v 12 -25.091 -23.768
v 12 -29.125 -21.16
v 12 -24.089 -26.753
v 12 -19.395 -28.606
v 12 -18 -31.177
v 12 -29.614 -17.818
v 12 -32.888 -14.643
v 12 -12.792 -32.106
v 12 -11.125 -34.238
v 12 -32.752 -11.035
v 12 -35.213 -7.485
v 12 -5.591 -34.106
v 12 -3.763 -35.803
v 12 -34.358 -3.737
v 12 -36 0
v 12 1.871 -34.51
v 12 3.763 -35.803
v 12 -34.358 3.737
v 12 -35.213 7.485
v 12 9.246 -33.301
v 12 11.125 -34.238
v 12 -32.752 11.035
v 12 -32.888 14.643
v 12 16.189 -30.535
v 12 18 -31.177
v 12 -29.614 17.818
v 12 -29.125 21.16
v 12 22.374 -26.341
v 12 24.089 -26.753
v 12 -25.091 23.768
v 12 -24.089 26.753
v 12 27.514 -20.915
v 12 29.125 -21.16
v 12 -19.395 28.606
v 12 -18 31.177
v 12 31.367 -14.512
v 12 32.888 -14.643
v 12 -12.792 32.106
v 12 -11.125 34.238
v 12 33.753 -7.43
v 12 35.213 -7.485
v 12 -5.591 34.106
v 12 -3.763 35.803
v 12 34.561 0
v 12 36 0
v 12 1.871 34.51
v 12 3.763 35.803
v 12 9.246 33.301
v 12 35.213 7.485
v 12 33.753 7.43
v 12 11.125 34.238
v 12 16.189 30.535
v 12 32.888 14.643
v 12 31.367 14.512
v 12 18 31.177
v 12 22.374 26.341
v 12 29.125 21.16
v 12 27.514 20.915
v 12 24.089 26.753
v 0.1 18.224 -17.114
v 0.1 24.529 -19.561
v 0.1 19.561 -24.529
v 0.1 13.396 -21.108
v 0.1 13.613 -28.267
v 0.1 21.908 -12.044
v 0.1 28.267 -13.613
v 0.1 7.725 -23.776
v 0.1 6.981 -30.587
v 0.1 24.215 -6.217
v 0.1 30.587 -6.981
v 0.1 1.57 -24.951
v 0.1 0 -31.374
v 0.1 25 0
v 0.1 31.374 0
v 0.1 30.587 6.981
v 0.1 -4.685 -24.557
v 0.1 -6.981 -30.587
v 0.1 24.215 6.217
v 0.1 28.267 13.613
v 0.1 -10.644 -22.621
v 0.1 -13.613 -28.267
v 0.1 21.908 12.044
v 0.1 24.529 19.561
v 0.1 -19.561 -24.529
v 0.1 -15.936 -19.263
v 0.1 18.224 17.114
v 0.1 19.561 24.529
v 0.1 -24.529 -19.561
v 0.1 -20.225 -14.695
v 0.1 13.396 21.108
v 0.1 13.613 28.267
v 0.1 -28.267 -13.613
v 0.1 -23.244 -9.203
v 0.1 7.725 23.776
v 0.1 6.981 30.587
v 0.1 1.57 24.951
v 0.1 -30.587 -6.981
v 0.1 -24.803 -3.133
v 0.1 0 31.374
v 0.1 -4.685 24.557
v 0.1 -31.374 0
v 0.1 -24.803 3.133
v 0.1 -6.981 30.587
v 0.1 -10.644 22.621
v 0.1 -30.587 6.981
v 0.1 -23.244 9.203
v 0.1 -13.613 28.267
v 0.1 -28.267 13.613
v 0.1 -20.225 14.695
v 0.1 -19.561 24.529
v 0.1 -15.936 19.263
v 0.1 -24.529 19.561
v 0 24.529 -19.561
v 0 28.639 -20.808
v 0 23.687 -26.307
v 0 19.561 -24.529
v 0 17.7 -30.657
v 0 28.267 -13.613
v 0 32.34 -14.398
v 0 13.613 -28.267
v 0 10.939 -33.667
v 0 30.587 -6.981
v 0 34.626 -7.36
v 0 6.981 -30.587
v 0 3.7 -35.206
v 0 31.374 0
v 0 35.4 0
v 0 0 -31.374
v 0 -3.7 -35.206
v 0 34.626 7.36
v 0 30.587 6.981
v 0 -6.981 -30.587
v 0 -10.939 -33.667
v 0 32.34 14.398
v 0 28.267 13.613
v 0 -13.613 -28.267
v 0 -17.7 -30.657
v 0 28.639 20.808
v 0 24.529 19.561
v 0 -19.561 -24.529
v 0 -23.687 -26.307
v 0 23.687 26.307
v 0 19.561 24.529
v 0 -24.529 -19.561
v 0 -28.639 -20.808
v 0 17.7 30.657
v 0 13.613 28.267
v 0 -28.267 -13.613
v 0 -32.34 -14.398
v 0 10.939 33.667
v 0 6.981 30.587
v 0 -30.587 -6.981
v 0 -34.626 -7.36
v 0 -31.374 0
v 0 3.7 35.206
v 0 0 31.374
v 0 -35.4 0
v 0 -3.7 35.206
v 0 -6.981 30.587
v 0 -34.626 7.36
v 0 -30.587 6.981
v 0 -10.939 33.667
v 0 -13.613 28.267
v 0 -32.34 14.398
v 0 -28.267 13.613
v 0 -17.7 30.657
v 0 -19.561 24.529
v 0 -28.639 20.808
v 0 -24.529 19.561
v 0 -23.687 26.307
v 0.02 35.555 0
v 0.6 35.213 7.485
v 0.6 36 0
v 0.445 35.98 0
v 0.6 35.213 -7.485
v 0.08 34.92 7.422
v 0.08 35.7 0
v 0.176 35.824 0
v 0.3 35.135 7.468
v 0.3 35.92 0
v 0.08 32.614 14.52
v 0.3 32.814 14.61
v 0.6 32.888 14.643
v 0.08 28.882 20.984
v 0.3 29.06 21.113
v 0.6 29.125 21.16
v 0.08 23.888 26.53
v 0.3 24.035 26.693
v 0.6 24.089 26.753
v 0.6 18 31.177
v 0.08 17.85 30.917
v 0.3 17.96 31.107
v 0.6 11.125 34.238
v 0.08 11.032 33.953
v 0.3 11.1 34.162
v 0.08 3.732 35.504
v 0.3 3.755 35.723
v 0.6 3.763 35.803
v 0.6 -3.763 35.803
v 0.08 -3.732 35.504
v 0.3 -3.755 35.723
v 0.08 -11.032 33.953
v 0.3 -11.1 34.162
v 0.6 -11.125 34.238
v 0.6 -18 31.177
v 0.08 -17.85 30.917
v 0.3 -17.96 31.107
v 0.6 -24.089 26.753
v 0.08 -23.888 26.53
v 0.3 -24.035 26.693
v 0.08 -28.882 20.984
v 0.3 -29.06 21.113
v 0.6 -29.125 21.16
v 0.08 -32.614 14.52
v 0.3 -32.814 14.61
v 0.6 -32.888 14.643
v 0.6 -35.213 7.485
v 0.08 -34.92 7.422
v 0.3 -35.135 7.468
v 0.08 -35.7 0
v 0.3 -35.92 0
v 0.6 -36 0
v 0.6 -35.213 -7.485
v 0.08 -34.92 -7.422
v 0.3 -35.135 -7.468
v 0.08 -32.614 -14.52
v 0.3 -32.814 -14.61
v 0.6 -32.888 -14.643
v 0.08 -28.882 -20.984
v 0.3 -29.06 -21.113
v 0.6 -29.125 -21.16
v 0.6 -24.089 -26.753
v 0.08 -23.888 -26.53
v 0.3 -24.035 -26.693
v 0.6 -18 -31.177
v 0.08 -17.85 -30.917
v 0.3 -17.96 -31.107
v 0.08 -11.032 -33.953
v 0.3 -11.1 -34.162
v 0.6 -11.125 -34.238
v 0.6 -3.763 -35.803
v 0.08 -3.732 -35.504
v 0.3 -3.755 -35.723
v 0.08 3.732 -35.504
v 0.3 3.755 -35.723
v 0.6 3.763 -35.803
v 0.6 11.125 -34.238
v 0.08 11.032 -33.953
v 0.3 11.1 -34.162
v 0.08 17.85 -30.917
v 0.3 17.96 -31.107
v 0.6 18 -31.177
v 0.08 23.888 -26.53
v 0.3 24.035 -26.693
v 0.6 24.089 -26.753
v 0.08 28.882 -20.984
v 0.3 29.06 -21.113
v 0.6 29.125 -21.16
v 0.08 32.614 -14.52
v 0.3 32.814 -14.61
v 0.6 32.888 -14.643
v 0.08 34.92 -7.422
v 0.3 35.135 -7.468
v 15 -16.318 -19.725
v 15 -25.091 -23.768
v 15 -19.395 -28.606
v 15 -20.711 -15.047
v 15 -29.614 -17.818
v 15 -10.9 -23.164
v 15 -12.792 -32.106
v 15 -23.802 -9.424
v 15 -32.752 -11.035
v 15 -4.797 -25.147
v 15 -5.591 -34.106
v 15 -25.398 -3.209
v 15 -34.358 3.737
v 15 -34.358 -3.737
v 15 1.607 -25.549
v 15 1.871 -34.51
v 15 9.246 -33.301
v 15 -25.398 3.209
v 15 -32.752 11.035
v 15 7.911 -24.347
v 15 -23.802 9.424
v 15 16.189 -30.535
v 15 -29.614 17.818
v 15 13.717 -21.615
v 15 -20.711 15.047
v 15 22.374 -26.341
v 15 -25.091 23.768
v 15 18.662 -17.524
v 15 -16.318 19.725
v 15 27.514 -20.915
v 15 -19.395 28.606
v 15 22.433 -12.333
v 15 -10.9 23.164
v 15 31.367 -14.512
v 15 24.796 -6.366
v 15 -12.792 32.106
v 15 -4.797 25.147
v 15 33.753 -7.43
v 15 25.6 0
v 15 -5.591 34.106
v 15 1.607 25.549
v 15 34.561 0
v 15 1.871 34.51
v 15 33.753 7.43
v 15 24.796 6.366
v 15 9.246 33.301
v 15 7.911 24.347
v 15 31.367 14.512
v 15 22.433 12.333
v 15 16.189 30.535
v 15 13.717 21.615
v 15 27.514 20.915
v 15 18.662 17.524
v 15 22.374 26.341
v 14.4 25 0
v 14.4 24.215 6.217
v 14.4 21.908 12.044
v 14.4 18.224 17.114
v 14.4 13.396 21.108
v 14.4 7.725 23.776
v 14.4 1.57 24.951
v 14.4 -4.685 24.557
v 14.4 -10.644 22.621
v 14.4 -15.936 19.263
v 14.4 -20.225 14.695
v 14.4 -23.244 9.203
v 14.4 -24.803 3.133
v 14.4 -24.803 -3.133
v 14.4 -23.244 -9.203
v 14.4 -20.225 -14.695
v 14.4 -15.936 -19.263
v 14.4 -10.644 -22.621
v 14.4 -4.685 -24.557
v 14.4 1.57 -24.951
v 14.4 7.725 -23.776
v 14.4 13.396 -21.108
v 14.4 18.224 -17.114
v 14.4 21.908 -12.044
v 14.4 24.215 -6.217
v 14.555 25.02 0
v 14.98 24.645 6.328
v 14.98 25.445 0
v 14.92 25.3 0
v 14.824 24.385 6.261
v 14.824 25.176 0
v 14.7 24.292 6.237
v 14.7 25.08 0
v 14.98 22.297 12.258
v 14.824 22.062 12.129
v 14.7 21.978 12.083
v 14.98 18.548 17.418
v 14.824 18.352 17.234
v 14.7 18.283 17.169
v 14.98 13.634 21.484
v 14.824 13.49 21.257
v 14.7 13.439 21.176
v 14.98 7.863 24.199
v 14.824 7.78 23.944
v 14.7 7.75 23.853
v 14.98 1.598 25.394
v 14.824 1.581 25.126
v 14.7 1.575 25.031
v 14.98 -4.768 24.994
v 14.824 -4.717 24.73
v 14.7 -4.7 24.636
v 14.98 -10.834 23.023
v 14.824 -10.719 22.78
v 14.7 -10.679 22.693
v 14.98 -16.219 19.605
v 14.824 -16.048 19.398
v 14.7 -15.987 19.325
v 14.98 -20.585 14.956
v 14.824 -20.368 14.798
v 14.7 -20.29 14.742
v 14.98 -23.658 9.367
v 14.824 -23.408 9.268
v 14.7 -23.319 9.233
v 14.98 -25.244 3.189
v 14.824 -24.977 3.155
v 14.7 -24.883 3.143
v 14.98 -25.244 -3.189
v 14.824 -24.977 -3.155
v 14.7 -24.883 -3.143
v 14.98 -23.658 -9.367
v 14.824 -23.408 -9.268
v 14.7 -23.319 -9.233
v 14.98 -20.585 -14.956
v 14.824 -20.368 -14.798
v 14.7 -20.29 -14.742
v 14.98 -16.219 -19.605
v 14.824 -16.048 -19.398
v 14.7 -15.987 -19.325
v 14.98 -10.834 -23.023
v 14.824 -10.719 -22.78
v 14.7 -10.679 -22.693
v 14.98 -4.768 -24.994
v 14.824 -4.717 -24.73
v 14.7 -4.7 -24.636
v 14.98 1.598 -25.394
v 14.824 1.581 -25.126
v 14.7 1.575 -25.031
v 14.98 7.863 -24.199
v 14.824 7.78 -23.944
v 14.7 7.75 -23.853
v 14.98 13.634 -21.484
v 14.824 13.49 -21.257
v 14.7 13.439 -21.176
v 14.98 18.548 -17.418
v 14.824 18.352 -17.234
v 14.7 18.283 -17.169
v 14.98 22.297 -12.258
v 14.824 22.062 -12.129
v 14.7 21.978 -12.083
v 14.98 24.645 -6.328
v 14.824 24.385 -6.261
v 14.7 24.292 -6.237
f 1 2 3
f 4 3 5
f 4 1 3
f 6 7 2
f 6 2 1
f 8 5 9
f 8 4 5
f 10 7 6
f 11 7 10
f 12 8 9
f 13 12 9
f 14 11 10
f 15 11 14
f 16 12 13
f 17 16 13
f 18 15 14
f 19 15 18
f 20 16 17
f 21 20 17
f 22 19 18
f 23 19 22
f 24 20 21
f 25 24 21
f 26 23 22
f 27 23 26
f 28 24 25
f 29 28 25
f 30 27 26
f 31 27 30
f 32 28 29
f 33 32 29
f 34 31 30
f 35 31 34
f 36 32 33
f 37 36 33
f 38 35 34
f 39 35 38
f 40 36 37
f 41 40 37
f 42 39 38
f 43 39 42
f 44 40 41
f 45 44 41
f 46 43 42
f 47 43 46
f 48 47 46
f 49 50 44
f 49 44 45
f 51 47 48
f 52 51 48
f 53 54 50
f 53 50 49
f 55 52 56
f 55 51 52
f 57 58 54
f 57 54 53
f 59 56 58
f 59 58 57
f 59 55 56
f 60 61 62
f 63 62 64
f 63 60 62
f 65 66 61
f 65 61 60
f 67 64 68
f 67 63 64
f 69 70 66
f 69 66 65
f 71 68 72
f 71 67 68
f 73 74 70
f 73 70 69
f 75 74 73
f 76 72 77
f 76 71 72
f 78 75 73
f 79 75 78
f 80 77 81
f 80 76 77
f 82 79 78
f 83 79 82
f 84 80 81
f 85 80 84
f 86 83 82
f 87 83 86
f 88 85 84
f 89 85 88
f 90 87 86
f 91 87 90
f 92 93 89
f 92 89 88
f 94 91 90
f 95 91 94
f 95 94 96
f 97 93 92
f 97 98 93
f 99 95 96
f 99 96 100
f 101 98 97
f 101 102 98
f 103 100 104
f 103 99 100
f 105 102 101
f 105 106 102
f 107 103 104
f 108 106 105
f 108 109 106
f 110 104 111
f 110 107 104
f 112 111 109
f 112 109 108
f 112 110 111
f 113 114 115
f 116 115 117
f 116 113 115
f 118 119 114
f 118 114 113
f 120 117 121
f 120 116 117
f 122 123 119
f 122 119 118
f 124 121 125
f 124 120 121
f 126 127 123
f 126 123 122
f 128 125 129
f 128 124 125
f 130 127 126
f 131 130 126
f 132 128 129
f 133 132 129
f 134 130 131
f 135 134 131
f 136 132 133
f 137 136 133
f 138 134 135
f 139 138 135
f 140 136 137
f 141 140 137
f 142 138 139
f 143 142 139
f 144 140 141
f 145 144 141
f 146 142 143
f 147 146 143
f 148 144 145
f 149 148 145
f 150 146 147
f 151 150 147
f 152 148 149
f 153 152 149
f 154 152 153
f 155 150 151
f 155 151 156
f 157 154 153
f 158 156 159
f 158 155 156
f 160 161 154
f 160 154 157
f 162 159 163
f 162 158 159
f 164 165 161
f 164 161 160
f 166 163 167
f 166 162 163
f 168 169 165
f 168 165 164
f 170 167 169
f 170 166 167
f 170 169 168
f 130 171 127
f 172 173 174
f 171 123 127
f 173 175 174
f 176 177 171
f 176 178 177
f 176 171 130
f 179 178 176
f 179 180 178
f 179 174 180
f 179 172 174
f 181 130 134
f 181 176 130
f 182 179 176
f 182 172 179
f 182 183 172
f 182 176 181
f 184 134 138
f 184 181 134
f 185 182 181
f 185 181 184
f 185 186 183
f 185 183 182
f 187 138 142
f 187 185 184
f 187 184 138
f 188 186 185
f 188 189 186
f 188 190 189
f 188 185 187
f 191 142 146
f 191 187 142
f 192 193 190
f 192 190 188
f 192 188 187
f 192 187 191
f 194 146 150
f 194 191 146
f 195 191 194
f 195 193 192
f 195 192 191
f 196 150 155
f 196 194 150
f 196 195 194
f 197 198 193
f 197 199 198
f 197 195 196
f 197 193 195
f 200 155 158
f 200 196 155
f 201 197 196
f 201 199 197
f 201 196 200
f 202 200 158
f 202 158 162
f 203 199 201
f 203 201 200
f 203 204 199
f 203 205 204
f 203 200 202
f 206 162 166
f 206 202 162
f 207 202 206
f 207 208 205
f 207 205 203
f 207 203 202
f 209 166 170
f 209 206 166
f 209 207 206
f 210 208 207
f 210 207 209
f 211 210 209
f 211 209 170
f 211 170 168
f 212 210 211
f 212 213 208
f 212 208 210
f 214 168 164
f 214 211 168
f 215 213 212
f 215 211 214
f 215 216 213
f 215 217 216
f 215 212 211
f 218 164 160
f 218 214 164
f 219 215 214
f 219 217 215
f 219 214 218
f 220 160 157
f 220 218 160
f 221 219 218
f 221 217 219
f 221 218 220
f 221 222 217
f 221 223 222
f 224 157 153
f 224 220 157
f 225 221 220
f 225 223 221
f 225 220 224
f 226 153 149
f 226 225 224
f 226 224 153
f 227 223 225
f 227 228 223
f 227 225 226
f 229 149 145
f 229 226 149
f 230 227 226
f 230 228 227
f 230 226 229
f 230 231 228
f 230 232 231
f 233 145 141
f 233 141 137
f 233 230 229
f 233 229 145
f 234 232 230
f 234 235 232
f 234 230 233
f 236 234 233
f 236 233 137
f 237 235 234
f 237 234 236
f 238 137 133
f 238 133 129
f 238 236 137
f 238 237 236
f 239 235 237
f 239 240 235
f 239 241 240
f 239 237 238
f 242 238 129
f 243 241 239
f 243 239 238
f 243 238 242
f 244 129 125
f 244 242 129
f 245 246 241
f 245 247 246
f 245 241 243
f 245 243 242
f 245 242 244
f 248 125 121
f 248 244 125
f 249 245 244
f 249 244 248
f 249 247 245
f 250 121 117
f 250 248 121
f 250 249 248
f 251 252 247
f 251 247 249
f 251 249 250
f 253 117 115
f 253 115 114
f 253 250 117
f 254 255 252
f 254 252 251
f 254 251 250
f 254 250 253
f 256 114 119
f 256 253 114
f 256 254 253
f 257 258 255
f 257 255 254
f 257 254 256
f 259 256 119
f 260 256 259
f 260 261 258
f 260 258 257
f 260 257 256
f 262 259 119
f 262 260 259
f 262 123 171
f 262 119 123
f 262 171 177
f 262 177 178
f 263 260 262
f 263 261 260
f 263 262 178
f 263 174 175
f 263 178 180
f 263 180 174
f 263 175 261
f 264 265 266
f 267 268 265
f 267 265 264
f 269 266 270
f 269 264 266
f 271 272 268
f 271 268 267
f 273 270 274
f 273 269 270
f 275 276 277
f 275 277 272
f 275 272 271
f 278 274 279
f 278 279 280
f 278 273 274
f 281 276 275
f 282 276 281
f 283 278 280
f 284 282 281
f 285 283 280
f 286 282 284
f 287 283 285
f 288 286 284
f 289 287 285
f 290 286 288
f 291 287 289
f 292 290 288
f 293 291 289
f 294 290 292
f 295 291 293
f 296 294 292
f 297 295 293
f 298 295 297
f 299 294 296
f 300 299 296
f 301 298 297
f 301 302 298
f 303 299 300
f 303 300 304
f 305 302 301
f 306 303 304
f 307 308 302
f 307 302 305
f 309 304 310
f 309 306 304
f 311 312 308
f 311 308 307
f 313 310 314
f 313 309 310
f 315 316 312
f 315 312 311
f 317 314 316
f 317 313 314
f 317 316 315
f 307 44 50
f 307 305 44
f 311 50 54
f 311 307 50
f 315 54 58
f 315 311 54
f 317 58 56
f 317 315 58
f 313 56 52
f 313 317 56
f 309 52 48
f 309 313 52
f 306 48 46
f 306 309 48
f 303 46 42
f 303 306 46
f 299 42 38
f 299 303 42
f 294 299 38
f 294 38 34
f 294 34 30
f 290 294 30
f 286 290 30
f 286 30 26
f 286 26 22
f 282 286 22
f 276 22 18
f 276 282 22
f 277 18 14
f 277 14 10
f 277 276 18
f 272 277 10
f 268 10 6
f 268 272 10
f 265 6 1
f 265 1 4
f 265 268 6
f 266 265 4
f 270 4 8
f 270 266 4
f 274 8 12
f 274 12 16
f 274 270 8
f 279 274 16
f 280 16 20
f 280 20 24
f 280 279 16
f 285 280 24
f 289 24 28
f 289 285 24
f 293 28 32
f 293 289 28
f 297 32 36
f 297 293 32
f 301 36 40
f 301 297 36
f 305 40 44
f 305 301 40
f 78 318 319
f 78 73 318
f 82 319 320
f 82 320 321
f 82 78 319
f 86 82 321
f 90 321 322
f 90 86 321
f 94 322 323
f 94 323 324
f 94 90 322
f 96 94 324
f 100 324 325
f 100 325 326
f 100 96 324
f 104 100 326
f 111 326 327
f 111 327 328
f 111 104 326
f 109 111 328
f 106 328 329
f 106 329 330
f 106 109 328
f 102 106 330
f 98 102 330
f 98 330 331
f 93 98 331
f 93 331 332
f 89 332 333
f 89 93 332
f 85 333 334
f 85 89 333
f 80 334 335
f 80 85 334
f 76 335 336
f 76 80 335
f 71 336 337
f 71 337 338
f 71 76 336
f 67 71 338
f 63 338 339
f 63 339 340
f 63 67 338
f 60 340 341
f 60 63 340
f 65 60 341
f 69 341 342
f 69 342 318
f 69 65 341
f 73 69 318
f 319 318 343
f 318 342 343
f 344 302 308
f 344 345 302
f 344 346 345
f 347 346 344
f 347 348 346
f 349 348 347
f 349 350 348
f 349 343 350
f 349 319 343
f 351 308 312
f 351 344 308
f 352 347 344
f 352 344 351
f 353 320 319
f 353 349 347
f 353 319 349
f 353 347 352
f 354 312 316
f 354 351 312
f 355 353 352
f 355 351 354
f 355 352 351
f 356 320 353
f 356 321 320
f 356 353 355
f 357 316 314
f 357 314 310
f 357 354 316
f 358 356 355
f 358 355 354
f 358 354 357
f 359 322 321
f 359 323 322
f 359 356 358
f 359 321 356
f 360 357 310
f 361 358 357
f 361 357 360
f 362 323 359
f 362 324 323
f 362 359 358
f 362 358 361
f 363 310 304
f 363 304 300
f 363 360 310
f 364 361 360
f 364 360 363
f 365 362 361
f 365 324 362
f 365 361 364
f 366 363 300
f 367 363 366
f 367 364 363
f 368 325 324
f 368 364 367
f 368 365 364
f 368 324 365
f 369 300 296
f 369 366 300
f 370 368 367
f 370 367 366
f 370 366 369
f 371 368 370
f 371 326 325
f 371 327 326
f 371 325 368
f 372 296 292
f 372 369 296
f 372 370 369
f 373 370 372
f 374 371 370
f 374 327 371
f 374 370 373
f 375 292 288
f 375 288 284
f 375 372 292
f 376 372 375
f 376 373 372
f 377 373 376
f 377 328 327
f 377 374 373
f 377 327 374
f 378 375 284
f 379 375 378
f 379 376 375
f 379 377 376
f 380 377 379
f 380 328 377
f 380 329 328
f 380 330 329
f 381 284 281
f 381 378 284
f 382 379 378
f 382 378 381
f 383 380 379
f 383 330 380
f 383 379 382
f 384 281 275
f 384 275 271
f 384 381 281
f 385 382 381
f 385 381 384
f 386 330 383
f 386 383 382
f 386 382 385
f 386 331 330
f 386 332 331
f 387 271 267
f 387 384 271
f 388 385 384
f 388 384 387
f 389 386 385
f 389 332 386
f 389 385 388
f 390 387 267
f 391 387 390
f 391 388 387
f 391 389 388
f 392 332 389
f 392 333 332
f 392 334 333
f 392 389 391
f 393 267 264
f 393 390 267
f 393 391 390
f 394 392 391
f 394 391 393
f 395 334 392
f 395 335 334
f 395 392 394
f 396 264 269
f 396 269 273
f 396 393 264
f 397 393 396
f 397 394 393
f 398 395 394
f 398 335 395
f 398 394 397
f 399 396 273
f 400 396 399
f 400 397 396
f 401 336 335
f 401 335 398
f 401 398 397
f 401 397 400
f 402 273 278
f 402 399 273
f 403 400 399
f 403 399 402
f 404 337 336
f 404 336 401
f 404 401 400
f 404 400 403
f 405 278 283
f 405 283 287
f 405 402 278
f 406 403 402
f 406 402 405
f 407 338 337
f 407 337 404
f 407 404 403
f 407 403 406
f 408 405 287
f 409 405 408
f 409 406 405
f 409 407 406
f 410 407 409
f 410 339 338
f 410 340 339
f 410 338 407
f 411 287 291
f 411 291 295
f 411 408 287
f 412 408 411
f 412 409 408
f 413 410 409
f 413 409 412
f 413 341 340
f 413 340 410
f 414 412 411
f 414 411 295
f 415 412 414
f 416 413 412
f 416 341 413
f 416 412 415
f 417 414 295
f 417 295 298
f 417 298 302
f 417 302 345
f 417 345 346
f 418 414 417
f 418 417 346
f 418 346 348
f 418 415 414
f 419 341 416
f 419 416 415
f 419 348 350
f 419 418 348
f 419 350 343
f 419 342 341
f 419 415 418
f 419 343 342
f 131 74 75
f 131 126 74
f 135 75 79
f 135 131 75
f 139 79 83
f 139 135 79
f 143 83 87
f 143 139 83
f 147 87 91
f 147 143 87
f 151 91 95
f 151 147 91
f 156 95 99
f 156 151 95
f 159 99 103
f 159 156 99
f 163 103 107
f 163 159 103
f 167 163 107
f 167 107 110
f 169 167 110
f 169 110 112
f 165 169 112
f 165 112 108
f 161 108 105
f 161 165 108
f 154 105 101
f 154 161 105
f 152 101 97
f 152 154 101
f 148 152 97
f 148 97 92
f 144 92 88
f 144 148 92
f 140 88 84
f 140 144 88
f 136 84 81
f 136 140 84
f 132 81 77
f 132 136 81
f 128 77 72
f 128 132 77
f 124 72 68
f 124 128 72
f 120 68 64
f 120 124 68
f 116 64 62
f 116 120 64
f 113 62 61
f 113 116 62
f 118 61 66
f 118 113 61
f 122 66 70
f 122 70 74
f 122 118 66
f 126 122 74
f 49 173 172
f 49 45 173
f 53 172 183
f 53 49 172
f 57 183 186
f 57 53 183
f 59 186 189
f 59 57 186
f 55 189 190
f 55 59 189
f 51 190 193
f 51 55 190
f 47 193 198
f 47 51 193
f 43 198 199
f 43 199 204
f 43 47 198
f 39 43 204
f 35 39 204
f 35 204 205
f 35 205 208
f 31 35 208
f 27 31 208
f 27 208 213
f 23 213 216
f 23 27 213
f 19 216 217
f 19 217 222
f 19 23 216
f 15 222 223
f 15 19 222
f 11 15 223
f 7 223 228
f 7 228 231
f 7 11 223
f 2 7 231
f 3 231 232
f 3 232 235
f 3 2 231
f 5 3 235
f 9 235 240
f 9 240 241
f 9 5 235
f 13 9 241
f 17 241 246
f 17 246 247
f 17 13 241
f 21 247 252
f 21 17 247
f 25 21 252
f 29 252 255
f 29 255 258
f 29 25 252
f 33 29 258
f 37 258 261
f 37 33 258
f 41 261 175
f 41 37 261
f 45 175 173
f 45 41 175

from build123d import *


with BuildPart() as part:
    # Эскиз1 → Повернуть1 (revolve)
    with BuildSketch(Plane.XY):
        with BuildLine():
            Line((0.6, 36), (12, 36))
            Line((12, 36), (12, 34.561))
            Line((12, 34.561), (15, 34.561))
            Line((15, 34.561), (15, 25.6))
            ThreePointArc((15, 25.6), (14.824264069, 25.175735931), (14.4, 25))
            Line((14.4, 25), (0.1, 25))
            Line((0.1, 25), (0.1, 31.374))
            Line((0.1, 31.374), (0, 31.374))
            Line((0, 31.374), (0, 35.4))
            ThreePointArc((0, 35.4), (0.175735931, 35.824264069), (0.6, 36))
        make_face()
    revolve(axis=Axis((-1000, 0, 0), (1, 0, 0)))


solid = part.part
